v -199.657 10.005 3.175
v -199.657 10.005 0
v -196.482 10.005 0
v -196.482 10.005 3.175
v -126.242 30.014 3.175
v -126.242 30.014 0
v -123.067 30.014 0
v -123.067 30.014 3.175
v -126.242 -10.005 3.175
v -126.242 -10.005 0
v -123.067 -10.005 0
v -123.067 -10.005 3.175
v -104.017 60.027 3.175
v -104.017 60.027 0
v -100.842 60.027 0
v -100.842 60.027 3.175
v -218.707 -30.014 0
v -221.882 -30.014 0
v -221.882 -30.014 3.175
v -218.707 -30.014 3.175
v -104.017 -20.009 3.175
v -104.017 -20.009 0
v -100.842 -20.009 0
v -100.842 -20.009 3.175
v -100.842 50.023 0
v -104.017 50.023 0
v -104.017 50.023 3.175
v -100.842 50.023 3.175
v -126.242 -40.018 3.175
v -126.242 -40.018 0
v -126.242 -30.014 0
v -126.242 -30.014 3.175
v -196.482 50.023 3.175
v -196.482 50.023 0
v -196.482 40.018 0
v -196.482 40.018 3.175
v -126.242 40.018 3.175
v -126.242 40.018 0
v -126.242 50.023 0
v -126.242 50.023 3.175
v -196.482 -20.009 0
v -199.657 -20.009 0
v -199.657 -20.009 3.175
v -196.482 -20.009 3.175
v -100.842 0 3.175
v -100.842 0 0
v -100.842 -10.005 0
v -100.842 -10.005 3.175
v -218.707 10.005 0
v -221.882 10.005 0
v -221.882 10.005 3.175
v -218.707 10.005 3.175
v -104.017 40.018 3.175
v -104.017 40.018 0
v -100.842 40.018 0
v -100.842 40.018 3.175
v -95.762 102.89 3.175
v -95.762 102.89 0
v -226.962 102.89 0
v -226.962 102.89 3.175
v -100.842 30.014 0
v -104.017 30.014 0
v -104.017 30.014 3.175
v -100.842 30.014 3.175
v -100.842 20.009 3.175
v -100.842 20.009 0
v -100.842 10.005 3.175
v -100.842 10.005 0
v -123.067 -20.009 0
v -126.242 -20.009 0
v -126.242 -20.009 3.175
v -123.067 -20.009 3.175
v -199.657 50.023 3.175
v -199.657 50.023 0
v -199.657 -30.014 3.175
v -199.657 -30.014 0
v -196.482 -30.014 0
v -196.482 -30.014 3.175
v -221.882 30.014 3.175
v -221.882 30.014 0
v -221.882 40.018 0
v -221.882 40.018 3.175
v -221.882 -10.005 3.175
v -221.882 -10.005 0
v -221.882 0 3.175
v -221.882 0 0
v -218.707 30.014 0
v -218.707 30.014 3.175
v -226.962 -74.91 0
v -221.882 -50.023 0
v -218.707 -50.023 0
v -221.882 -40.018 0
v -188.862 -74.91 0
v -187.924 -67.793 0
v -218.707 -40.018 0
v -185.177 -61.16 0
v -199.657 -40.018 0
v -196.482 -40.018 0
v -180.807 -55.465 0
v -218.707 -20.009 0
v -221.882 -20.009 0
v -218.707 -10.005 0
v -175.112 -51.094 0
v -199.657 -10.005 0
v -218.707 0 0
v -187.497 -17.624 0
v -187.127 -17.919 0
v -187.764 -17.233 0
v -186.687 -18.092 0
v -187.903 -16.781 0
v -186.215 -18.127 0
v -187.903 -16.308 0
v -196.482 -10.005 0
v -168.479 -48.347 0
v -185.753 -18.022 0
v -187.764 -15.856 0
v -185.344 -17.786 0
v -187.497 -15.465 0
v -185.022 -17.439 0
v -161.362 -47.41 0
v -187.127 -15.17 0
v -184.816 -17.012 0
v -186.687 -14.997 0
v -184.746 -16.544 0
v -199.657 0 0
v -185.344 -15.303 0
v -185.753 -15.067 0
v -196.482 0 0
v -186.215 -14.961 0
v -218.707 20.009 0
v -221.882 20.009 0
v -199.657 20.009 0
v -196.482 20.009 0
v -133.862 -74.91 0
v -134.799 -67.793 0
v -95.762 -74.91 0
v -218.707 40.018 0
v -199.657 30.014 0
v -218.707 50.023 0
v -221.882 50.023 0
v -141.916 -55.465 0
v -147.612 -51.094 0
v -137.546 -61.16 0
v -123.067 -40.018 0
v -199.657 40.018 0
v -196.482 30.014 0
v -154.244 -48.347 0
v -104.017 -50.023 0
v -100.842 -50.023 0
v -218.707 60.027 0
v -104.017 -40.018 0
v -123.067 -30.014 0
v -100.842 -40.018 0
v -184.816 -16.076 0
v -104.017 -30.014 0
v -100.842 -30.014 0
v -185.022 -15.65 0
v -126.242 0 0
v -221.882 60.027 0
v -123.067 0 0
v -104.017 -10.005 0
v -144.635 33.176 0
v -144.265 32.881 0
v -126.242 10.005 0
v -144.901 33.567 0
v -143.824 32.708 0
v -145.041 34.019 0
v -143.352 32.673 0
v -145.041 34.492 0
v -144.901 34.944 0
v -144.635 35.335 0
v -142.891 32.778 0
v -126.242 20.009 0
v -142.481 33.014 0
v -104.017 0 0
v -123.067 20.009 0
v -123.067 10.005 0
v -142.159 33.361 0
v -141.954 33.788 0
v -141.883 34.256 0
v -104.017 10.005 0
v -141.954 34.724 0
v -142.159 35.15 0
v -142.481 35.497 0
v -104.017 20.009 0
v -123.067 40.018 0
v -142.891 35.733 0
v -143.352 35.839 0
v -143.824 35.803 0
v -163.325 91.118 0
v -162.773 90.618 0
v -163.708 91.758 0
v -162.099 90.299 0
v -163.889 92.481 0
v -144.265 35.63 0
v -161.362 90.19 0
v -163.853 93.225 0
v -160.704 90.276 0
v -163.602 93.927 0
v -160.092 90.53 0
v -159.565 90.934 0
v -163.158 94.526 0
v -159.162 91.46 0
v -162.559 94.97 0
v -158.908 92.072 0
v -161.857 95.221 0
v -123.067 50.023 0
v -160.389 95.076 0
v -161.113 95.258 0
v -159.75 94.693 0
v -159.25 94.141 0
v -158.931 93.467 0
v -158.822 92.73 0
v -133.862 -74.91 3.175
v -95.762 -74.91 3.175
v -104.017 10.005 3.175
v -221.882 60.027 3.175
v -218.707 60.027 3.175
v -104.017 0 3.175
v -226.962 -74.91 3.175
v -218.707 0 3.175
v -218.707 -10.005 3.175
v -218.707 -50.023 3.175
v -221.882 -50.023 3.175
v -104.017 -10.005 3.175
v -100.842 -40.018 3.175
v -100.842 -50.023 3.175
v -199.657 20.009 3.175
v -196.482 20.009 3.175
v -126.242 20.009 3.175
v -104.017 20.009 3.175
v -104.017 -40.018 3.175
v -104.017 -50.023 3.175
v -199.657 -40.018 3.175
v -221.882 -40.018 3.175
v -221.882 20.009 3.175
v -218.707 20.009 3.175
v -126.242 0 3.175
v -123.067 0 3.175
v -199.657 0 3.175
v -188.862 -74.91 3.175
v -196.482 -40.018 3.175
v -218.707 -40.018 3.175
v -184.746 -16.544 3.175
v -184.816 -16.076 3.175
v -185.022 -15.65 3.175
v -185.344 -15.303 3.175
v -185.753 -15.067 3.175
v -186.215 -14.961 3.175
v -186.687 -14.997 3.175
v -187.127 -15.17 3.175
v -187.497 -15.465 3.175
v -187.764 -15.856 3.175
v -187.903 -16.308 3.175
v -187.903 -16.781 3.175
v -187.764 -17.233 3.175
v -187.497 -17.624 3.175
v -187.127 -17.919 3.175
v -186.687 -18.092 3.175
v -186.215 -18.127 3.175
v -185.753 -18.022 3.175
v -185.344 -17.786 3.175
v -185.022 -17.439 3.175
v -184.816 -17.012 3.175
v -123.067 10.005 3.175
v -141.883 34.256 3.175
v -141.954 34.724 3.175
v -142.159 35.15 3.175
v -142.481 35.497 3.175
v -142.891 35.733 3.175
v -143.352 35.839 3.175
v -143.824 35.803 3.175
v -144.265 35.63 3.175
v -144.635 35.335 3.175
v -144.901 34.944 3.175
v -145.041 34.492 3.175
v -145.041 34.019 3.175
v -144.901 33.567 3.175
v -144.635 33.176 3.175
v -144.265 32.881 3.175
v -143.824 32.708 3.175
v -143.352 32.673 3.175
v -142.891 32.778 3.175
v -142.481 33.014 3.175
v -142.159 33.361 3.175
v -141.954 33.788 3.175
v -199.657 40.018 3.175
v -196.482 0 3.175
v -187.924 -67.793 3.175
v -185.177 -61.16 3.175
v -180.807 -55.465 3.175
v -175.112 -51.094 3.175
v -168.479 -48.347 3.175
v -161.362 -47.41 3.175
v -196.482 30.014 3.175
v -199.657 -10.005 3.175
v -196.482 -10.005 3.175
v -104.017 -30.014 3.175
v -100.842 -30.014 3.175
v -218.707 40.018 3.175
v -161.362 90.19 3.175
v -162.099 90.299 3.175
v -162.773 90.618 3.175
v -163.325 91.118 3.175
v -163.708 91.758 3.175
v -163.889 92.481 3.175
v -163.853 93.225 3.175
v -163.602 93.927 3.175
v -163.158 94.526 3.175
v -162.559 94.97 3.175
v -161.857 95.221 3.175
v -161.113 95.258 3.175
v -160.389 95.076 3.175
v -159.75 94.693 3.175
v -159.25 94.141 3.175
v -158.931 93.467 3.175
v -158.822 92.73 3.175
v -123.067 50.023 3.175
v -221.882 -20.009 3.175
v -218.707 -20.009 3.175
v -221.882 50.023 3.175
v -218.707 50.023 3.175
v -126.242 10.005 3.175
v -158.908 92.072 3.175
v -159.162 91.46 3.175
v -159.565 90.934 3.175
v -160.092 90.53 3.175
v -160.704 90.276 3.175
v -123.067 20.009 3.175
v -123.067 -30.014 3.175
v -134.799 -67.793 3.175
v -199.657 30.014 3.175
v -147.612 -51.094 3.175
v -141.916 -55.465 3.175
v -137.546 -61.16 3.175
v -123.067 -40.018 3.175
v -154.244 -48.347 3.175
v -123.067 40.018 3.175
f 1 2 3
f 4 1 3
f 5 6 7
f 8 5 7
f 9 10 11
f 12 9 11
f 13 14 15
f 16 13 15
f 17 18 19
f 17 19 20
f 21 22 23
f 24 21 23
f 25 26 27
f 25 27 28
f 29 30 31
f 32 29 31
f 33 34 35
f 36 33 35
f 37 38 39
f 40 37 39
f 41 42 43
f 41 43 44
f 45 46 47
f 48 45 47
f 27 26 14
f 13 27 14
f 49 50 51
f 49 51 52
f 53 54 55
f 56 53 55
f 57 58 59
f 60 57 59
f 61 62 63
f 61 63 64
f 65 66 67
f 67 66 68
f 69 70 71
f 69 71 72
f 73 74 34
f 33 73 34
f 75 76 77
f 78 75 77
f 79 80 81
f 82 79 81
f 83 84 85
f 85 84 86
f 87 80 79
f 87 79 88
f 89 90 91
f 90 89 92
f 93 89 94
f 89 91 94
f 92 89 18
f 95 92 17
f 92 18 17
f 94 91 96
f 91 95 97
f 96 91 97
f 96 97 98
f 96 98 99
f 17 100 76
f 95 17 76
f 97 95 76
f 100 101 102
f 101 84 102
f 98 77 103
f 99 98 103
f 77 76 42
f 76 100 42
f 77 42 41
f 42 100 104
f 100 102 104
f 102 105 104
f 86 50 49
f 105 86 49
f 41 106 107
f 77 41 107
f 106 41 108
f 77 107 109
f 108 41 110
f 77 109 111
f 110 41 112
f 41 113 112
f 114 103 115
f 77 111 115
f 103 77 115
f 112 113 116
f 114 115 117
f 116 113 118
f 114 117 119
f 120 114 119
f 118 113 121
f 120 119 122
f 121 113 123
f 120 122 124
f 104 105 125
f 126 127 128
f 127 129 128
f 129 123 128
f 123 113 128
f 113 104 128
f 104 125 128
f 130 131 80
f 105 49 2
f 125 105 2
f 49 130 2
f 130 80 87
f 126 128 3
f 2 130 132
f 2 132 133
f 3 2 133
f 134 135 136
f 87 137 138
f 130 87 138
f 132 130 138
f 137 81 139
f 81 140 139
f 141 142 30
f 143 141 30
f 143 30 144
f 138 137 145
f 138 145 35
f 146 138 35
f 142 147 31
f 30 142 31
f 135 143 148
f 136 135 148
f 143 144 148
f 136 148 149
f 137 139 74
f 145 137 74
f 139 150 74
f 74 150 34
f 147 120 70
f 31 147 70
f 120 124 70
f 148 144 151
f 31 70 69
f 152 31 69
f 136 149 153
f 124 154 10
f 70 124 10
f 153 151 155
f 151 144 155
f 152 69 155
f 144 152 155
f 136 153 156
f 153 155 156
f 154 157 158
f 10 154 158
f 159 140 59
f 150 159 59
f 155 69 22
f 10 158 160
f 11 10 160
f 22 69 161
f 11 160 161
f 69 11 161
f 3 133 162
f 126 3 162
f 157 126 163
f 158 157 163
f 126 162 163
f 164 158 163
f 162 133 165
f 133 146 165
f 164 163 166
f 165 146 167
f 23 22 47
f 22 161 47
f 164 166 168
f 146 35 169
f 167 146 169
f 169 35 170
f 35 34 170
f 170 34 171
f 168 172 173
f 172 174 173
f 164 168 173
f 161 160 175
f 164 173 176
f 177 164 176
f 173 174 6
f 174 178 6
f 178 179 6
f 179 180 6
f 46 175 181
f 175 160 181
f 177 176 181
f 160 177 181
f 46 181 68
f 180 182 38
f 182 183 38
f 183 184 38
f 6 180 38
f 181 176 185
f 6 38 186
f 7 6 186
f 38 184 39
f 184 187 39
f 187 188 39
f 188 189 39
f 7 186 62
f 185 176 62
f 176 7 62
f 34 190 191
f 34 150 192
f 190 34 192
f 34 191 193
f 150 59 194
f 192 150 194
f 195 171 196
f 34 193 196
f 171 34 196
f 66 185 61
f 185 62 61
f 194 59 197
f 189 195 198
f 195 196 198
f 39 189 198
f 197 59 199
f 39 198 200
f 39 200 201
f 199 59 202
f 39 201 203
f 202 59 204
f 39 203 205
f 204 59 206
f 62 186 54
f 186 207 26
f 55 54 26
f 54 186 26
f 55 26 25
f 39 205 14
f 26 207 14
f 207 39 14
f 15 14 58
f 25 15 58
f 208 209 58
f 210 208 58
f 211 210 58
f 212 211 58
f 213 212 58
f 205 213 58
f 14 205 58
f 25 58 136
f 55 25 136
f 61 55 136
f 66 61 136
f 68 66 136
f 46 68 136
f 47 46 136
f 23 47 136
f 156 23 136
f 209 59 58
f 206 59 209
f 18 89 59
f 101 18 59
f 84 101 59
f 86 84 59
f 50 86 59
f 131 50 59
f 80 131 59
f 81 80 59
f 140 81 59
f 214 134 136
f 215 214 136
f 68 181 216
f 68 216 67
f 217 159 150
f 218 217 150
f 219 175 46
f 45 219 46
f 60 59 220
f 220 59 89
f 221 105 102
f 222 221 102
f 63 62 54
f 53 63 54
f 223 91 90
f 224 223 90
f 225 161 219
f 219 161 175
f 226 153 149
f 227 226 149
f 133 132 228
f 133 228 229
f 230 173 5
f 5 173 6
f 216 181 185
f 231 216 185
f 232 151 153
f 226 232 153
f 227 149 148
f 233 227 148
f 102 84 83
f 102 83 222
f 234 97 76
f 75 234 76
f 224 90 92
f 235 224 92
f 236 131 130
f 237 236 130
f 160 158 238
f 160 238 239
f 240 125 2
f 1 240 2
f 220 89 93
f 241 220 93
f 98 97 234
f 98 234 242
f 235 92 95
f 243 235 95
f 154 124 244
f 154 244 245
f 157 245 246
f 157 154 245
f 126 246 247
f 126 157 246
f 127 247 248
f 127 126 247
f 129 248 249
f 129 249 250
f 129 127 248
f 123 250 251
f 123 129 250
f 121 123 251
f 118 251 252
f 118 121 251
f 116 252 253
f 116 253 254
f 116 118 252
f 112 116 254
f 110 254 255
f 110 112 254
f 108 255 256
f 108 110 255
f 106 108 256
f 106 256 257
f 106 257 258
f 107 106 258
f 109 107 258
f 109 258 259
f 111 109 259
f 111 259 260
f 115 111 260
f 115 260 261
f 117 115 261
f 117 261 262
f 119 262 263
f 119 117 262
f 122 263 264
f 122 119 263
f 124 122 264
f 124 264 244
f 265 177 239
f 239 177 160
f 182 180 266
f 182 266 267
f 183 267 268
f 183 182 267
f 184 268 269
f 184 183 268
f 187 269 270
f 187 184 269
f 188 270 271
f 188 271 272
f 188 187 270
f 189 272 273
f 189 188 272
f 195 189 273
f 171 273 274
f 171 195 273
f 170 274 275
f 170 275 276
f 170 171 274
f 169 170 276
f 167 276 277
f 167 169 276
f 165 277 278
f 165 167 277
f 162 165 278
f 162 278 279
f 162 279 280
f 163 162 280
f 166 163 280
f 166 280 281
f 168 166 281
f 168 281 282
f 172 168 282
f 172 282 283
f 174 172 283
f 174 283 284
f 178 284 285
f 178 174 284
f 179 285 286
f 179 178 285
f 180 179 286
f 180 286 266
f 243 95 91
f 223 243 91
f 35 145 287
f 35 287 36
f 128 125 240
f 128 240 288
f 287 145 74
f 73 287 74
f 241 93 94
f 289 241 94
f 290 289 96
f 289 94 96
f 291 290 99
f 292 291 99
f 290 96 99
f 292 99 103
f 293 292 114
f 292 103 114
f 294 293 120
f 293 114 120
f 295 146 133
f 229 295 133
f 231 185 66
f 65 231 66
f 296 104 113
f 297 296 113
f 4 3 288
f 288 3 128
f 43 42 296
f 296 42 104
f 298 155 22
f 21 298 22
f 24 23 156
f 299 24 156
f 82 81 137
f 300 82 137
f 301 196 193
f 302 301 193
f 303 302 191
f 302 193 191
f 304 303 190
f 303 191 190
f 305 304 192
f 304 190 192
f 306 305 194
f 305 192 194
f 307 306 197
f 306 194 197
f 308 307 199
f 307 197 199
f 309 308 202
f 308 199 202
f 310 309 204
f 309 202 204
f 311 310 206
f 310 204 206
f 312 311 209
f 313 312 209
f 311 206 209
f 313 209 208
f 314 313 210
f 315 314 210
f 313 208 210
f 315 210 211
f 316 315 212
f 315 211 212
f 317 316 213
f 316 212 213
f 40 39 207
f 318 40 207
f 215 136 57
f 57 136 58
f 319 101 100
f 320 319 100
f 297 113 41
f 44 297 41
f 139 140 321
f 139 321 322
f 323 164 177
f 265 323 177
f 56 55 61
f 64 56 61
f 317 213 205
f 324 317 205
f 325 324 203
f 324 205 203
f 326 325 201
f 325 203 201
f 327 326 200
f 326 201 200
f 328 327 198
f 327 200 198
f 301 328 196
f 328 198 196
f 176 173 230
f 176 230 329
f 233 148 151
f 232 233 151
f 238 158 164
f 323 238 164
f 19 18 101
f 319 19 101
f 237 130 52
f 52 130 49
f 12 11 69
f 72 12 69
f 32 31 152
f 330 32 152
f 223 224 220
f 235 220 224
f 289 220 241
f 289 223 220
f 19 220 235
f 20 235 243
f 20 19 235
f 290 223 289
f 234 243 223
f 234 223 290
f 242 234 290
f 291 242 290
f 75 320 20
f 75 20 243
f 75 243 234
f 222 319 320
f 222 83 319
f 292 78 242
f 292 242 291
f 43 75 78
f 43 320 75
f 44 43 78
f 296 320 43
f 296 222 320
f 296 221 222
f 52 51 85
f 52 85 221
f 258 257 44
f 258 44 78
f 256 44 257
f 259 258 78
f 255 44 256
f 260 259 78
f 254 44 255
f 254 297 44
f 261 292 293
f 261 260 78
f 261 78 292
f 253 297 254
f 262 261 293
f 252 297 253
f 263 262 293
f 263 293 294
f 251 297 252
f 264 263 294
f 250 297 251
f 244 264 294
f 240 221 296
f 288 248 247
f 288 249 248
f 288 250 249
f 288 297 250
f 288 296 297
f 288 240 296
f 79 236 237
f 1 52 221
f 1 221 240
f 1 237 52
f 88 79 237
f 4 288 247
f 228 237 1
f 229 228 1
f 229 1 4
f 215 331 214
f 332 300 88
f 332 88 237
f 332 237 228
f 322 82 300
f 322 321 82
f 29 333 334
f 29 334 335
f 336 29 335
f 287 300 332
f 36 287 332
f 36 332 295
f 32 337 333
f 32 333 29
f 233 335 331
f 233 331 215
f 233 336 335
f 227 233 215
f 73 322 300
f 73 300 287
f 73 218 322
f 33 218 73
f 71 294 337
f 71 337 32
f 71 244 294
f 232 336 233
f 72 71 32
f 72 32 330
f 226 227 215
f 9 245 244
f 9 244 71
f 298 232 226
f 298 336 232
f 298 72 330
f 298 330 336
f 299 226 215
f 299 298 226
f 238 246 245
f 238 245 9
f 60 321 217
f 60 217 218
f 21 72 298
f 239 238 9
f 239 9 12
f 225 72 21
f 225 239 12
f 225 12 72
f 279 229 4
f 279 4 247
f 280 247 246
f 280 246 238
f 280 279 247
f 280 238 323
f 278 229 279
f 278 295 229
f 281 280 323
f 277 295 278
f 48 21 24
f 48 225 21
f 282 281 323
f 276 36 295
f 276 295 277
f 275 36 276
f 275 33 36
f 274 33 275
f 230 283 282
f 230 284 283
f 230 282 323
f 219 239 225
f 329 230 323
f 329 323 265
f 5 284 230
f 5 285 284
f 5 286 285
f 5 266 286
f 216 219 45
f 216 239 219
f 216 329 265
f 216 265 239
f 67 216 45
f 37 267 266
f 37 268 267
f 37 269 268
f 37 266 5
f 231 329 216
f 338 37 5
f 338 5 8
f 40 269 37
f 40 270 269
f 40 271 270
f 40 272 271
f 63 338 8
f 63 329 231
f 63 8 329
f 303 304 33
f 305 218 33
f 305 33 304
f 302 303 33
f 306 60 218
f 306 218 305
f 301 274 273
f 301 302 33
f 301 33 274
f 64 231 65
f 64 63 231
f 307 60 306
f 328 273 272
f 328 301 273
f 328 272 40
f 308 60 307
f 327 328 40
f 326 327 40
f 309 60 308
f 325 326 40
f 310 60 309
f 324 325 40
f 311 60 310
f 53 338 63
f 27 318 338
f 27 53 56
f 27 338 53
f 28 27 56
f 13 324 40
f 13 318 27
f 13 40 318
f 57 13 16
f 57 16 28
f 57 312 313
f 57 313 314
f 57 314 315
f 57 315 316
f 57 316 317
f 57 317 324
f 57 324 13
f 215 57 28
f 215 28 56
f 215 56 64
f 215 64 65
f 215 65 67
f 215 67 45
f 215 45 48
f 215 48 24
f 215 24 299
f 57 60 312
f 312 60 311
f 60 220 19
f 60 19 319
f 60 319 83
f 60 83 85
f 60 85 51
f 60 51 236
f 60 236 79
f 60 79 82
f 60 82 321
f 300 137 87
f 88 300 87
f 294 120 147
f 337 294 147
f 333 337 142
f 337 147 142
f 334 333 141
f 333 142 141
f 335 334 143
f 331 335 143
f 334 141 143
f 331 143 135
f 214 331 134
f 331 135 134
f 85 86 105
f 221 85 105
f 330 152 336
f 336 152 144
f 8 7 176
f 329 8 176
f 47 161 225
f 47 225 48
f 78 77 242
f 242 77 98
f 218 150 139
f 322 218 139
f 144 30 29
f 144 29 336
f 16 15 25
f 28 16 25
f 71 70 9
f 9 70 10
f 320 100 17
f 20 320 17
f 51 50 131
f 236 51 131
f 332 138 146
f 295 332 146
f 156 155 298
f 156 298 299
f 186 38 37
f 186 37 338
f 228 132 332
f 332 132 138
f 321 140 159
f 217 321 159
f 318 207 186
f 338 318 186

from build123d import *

# Parameters (mm, degrees)
F0_R     = 1.5875
F0_W     = 3.175
F0_H     = 10.004552
F1_DEPTH = 3.175


# Not quite as in the source:
# - a length typed as a fraction of an inch, garbled in the dataset ("3 / 203.2 mm" for 3/8 in), is restored
# - a feature names something its author has since deleted; it is built from what else it names


with BuildPart() as f1:
    # F0 (on Top) → F1 (new body)
    with BuildSketch(Plane.XY):
        with BuildLine():
            Line((-226.9615088272, -74.910188), (-188.8615088272, -74.910188))
            ThreePointArc((-188.8615088272, -74.910188), (-180.8069453098, -55.4647515174), (-161.3615088272, -47.410188))
            ThreePointArc((-161.3615088272, -47.410188), (-141.9160723446, -55.4647515174), (-133.8615088272, -74.910188))
            Line((-133.8615088272, -74.910188), (-95.7615088272, -74.910188))
            Line((-95.7615088272, -74.910188), (-95.7615088272, 102.889812))
            Line((-95.7615088272, 102.889812), (-226.9615088272, 102.889812))
            Line((-226.9615088272, 102.889812), (-226.9615088272, -74.910188))
        make_face()
        Polygon((-221.8815088272, 50.02276), (-221.8815088272, 60.027312), (-218.7065088272, 60.027312), (-218.7065088272, 50.02276), (-218.7065088272, 40.018208), (-218.7065088272, 30.013656), (-218.7065088272, 20.009104), (-218.7065088272, 10.004552), (-218.7065088272, 0), (-218.7065088272, -10.004552), (-218.7065088272, -20.009104), (-218.7065088272, -30.013656), (-218.7065088272, -40.018208), (-218.7065088272, -50.02276), (-221.8815088272, -50.02276), (-221.8815088272, -40.018208), (-221.8815088272, -30.013656), (-221.8815088272, -20.009104), (-221.8815088272, -10.004552), (-221.8815088272, 0), (-221.8815088272, 10.004552), (-221.8815088272, 20.009104), (-221.8815088272, 30.013656), (-221.8815088272, 40.018208), align=None, mode=Mode.SUBTRACT)
        Polygon((-199.6565088272, 60.027312), (-196.4815088272, 60.027312), (-196.4815088272, 50.02276), (-196.4815088272, 40.018208), (-196.4815088272, 30.013656), (-196.4815088272, 20.009104), (-196.4815088272, 10.004552), (-196.4815088272, 0), (-196.4815088272, -10.004552), (-196.4815088272, -20.009104), (-196.4815088272, -30.013656), (-196.4815088272, -40.018208), (-196.4815088272, -50.02276), (-199.6565088272, -50.02276), (-199.6565088272, -40.018208), (-199.6565088272, -30.013656), (-199.6565088272, -20.009104), (-199.6565088272, -10.004552), (-199.6565088272, 0), (-199.6565088272, 10.004552), (-199.6565088272, 20.009104), (-199.6565088272, 30.013656), (-199.6565088272, 40.018208), (-199.6565088272, 50.02276), align=None, mode=Mode.SUBTRACT)
        with Locations((-186.3334280729, -16.5444072336)):
            Circle(F0_R, mode=Mode.SUBTRACT)
        Polygon((-126.2415088272, 60.027312), (-123.0665088272, 60.027312), (-123.0665088272, 50.02276), (-123.0665088272, 40.018208), (-123.0665088272, 30.013656), (-123.0665088272, 20.009104), (-123.0665088272, 10.004552), (-123.0665088272, 0), (-123.0665088272, -10.004552), (-123.0665088272, -20.009104), (-123.0665088272, -30.013656), (-123.0665088272, -40.018208), (-123.0665088272, -50.02276), (-126.2415088272, -50.02276), (-126.2415088272, -40.018208), (-126.2415088272, -30.013656), (-126.2415088272, -20.009104), (-126.2415088272, -10.004552), (-126.2415088272, 0), (-126.2415088272, 10.004552), (-126.2415088272, 20.009104), (-126.2415088272, 30.013656), (-126.2415088272, 40.018208), (-126.2415088272, 50.02276), align=None, mode=Mode.SUBTRACT)
        Polygon((-104.0165088272, 50.02276), (-104.0165088272, 60.027312), (-100.8415088272, 60.027312), (-100.8415088272, 50.02276), (-100.8415088272, 40.018208), (-100.8415088272, 30.013656), (-100.8415088272, 20.009104), (-100.8415088272, 10.004552), (-100.8415088272, 0), (-100.8415088272, -10.004552), (-100.8415088272, -20.009104), (-100.8415088272, -30.013656), (-100.8415088272, -40.018208), (-100.8415088272, -50.02276), (-104.0165088272, -50.02276), (-104.0165088272, -40.018208), (-104.0165088272, -30.013656), (-104.0165088272, -20.009104), (-104.0165088272, -10.004552), (-104.0165088272, 0), (-104.0165088272, 10.004552), (-104.0165088272, 20.009104), (-104.0165088272, 30.013656), (-104.0165088272, 40.018208), align=None, mode=Mode.SUBTRACT)
        with BuildLine():
            ThreePointArc((-158.8215088272, 92.729812), (-159.565457603, 90.9337607758), (-161.3615088272, 90.189812))
            ThreePointArc((-161.3615088272, 90.189812), (-163.1575600514, 94.5258632242), (-158.8215088272, 92.729812))
        make_face(mode=Mode.SUBTRACT)
        with Locations((-143.4709280729, 34.2555927664)):
            Circle(F0_R, mode=Mode.SUBTRACT)
        with Locations((-198.0690088272, -45.020484)):
            Rectangle(F0_W, F0_H)
        with Locations((-198.0690088272, -25.01138)):
            Rectangle(F0_W, F0_H)
        with Locations((-198.0690088272, -5.002276)):
            Rectangle(F0_W, F0_H)
        with Locations((-198.0690088272, 15.006828)):
            Rectangle(F0_W, F0_H)
        with Locations((-198.0690088272, 35.015932)):
            Rectangle(F0_W, F0_H)
        with Locations((-198.0690088272, 55.025036)):
            Rectangle(F0_W, F0_H)
        with Locations((-220.2940088272, -35.015932)):
            Rectangle(F0_W, F0_H)
        with Locations((-220.2940088272, -15.006828)):
            Rectangle(F0_W, F0_H)
        with Locations((-220.2940088272, 5.002276)):
            Rectangle(F0_W, F0_H)
        with Locations((-220.2940088272, 25.01138)):
            Rectangle(F0_W, F0_H)
        with Locations((-220.2940088272, 45.020484)):
            Rectangle(F0_W, F0_H)
        with Locations((-102.4290088272, 45.020484)):
            Rectangle(F0_W, F0_H)
        with Locations((-102.4290088272, 25.01138)):
            Rectangle(F0_W, F0_H)
        with Locations((-102.4290088272, 5.002276)):
            Rectangle(F0_W, F0_H)
        with Locations((-102.4290088272, -15.006828)):
            Rectangle(F0_W, F0_H)
        with Locations((-102.4290088272, -35.015932)):
            Rectangle(F0_W, F0_H)
        with Locations((-124.6540088272, 55.025036)):
            Rectangle(F0_W, F0_H)
        with Locations((-124.6540088272, 35.015932)):
            Rectangle(F0_W, F0_H)
        with Locations((-124.6540088272, 15.006828)):
            Rectangle(F0_W, F0_H)
        with Locations((-124.6540088272, -5.002276)):
            Rectangle(F0_W, F0_H)
        with Locations((-124.6540088272, -25.01138)):
            Rectangle(F0_W, F0_H)
        with Locations((-124.6540088272, -45.020484)):
            Rectangle(F0_W, F0_H)
    extrude(amount=F1_DEPTH)


solid = f1.part
